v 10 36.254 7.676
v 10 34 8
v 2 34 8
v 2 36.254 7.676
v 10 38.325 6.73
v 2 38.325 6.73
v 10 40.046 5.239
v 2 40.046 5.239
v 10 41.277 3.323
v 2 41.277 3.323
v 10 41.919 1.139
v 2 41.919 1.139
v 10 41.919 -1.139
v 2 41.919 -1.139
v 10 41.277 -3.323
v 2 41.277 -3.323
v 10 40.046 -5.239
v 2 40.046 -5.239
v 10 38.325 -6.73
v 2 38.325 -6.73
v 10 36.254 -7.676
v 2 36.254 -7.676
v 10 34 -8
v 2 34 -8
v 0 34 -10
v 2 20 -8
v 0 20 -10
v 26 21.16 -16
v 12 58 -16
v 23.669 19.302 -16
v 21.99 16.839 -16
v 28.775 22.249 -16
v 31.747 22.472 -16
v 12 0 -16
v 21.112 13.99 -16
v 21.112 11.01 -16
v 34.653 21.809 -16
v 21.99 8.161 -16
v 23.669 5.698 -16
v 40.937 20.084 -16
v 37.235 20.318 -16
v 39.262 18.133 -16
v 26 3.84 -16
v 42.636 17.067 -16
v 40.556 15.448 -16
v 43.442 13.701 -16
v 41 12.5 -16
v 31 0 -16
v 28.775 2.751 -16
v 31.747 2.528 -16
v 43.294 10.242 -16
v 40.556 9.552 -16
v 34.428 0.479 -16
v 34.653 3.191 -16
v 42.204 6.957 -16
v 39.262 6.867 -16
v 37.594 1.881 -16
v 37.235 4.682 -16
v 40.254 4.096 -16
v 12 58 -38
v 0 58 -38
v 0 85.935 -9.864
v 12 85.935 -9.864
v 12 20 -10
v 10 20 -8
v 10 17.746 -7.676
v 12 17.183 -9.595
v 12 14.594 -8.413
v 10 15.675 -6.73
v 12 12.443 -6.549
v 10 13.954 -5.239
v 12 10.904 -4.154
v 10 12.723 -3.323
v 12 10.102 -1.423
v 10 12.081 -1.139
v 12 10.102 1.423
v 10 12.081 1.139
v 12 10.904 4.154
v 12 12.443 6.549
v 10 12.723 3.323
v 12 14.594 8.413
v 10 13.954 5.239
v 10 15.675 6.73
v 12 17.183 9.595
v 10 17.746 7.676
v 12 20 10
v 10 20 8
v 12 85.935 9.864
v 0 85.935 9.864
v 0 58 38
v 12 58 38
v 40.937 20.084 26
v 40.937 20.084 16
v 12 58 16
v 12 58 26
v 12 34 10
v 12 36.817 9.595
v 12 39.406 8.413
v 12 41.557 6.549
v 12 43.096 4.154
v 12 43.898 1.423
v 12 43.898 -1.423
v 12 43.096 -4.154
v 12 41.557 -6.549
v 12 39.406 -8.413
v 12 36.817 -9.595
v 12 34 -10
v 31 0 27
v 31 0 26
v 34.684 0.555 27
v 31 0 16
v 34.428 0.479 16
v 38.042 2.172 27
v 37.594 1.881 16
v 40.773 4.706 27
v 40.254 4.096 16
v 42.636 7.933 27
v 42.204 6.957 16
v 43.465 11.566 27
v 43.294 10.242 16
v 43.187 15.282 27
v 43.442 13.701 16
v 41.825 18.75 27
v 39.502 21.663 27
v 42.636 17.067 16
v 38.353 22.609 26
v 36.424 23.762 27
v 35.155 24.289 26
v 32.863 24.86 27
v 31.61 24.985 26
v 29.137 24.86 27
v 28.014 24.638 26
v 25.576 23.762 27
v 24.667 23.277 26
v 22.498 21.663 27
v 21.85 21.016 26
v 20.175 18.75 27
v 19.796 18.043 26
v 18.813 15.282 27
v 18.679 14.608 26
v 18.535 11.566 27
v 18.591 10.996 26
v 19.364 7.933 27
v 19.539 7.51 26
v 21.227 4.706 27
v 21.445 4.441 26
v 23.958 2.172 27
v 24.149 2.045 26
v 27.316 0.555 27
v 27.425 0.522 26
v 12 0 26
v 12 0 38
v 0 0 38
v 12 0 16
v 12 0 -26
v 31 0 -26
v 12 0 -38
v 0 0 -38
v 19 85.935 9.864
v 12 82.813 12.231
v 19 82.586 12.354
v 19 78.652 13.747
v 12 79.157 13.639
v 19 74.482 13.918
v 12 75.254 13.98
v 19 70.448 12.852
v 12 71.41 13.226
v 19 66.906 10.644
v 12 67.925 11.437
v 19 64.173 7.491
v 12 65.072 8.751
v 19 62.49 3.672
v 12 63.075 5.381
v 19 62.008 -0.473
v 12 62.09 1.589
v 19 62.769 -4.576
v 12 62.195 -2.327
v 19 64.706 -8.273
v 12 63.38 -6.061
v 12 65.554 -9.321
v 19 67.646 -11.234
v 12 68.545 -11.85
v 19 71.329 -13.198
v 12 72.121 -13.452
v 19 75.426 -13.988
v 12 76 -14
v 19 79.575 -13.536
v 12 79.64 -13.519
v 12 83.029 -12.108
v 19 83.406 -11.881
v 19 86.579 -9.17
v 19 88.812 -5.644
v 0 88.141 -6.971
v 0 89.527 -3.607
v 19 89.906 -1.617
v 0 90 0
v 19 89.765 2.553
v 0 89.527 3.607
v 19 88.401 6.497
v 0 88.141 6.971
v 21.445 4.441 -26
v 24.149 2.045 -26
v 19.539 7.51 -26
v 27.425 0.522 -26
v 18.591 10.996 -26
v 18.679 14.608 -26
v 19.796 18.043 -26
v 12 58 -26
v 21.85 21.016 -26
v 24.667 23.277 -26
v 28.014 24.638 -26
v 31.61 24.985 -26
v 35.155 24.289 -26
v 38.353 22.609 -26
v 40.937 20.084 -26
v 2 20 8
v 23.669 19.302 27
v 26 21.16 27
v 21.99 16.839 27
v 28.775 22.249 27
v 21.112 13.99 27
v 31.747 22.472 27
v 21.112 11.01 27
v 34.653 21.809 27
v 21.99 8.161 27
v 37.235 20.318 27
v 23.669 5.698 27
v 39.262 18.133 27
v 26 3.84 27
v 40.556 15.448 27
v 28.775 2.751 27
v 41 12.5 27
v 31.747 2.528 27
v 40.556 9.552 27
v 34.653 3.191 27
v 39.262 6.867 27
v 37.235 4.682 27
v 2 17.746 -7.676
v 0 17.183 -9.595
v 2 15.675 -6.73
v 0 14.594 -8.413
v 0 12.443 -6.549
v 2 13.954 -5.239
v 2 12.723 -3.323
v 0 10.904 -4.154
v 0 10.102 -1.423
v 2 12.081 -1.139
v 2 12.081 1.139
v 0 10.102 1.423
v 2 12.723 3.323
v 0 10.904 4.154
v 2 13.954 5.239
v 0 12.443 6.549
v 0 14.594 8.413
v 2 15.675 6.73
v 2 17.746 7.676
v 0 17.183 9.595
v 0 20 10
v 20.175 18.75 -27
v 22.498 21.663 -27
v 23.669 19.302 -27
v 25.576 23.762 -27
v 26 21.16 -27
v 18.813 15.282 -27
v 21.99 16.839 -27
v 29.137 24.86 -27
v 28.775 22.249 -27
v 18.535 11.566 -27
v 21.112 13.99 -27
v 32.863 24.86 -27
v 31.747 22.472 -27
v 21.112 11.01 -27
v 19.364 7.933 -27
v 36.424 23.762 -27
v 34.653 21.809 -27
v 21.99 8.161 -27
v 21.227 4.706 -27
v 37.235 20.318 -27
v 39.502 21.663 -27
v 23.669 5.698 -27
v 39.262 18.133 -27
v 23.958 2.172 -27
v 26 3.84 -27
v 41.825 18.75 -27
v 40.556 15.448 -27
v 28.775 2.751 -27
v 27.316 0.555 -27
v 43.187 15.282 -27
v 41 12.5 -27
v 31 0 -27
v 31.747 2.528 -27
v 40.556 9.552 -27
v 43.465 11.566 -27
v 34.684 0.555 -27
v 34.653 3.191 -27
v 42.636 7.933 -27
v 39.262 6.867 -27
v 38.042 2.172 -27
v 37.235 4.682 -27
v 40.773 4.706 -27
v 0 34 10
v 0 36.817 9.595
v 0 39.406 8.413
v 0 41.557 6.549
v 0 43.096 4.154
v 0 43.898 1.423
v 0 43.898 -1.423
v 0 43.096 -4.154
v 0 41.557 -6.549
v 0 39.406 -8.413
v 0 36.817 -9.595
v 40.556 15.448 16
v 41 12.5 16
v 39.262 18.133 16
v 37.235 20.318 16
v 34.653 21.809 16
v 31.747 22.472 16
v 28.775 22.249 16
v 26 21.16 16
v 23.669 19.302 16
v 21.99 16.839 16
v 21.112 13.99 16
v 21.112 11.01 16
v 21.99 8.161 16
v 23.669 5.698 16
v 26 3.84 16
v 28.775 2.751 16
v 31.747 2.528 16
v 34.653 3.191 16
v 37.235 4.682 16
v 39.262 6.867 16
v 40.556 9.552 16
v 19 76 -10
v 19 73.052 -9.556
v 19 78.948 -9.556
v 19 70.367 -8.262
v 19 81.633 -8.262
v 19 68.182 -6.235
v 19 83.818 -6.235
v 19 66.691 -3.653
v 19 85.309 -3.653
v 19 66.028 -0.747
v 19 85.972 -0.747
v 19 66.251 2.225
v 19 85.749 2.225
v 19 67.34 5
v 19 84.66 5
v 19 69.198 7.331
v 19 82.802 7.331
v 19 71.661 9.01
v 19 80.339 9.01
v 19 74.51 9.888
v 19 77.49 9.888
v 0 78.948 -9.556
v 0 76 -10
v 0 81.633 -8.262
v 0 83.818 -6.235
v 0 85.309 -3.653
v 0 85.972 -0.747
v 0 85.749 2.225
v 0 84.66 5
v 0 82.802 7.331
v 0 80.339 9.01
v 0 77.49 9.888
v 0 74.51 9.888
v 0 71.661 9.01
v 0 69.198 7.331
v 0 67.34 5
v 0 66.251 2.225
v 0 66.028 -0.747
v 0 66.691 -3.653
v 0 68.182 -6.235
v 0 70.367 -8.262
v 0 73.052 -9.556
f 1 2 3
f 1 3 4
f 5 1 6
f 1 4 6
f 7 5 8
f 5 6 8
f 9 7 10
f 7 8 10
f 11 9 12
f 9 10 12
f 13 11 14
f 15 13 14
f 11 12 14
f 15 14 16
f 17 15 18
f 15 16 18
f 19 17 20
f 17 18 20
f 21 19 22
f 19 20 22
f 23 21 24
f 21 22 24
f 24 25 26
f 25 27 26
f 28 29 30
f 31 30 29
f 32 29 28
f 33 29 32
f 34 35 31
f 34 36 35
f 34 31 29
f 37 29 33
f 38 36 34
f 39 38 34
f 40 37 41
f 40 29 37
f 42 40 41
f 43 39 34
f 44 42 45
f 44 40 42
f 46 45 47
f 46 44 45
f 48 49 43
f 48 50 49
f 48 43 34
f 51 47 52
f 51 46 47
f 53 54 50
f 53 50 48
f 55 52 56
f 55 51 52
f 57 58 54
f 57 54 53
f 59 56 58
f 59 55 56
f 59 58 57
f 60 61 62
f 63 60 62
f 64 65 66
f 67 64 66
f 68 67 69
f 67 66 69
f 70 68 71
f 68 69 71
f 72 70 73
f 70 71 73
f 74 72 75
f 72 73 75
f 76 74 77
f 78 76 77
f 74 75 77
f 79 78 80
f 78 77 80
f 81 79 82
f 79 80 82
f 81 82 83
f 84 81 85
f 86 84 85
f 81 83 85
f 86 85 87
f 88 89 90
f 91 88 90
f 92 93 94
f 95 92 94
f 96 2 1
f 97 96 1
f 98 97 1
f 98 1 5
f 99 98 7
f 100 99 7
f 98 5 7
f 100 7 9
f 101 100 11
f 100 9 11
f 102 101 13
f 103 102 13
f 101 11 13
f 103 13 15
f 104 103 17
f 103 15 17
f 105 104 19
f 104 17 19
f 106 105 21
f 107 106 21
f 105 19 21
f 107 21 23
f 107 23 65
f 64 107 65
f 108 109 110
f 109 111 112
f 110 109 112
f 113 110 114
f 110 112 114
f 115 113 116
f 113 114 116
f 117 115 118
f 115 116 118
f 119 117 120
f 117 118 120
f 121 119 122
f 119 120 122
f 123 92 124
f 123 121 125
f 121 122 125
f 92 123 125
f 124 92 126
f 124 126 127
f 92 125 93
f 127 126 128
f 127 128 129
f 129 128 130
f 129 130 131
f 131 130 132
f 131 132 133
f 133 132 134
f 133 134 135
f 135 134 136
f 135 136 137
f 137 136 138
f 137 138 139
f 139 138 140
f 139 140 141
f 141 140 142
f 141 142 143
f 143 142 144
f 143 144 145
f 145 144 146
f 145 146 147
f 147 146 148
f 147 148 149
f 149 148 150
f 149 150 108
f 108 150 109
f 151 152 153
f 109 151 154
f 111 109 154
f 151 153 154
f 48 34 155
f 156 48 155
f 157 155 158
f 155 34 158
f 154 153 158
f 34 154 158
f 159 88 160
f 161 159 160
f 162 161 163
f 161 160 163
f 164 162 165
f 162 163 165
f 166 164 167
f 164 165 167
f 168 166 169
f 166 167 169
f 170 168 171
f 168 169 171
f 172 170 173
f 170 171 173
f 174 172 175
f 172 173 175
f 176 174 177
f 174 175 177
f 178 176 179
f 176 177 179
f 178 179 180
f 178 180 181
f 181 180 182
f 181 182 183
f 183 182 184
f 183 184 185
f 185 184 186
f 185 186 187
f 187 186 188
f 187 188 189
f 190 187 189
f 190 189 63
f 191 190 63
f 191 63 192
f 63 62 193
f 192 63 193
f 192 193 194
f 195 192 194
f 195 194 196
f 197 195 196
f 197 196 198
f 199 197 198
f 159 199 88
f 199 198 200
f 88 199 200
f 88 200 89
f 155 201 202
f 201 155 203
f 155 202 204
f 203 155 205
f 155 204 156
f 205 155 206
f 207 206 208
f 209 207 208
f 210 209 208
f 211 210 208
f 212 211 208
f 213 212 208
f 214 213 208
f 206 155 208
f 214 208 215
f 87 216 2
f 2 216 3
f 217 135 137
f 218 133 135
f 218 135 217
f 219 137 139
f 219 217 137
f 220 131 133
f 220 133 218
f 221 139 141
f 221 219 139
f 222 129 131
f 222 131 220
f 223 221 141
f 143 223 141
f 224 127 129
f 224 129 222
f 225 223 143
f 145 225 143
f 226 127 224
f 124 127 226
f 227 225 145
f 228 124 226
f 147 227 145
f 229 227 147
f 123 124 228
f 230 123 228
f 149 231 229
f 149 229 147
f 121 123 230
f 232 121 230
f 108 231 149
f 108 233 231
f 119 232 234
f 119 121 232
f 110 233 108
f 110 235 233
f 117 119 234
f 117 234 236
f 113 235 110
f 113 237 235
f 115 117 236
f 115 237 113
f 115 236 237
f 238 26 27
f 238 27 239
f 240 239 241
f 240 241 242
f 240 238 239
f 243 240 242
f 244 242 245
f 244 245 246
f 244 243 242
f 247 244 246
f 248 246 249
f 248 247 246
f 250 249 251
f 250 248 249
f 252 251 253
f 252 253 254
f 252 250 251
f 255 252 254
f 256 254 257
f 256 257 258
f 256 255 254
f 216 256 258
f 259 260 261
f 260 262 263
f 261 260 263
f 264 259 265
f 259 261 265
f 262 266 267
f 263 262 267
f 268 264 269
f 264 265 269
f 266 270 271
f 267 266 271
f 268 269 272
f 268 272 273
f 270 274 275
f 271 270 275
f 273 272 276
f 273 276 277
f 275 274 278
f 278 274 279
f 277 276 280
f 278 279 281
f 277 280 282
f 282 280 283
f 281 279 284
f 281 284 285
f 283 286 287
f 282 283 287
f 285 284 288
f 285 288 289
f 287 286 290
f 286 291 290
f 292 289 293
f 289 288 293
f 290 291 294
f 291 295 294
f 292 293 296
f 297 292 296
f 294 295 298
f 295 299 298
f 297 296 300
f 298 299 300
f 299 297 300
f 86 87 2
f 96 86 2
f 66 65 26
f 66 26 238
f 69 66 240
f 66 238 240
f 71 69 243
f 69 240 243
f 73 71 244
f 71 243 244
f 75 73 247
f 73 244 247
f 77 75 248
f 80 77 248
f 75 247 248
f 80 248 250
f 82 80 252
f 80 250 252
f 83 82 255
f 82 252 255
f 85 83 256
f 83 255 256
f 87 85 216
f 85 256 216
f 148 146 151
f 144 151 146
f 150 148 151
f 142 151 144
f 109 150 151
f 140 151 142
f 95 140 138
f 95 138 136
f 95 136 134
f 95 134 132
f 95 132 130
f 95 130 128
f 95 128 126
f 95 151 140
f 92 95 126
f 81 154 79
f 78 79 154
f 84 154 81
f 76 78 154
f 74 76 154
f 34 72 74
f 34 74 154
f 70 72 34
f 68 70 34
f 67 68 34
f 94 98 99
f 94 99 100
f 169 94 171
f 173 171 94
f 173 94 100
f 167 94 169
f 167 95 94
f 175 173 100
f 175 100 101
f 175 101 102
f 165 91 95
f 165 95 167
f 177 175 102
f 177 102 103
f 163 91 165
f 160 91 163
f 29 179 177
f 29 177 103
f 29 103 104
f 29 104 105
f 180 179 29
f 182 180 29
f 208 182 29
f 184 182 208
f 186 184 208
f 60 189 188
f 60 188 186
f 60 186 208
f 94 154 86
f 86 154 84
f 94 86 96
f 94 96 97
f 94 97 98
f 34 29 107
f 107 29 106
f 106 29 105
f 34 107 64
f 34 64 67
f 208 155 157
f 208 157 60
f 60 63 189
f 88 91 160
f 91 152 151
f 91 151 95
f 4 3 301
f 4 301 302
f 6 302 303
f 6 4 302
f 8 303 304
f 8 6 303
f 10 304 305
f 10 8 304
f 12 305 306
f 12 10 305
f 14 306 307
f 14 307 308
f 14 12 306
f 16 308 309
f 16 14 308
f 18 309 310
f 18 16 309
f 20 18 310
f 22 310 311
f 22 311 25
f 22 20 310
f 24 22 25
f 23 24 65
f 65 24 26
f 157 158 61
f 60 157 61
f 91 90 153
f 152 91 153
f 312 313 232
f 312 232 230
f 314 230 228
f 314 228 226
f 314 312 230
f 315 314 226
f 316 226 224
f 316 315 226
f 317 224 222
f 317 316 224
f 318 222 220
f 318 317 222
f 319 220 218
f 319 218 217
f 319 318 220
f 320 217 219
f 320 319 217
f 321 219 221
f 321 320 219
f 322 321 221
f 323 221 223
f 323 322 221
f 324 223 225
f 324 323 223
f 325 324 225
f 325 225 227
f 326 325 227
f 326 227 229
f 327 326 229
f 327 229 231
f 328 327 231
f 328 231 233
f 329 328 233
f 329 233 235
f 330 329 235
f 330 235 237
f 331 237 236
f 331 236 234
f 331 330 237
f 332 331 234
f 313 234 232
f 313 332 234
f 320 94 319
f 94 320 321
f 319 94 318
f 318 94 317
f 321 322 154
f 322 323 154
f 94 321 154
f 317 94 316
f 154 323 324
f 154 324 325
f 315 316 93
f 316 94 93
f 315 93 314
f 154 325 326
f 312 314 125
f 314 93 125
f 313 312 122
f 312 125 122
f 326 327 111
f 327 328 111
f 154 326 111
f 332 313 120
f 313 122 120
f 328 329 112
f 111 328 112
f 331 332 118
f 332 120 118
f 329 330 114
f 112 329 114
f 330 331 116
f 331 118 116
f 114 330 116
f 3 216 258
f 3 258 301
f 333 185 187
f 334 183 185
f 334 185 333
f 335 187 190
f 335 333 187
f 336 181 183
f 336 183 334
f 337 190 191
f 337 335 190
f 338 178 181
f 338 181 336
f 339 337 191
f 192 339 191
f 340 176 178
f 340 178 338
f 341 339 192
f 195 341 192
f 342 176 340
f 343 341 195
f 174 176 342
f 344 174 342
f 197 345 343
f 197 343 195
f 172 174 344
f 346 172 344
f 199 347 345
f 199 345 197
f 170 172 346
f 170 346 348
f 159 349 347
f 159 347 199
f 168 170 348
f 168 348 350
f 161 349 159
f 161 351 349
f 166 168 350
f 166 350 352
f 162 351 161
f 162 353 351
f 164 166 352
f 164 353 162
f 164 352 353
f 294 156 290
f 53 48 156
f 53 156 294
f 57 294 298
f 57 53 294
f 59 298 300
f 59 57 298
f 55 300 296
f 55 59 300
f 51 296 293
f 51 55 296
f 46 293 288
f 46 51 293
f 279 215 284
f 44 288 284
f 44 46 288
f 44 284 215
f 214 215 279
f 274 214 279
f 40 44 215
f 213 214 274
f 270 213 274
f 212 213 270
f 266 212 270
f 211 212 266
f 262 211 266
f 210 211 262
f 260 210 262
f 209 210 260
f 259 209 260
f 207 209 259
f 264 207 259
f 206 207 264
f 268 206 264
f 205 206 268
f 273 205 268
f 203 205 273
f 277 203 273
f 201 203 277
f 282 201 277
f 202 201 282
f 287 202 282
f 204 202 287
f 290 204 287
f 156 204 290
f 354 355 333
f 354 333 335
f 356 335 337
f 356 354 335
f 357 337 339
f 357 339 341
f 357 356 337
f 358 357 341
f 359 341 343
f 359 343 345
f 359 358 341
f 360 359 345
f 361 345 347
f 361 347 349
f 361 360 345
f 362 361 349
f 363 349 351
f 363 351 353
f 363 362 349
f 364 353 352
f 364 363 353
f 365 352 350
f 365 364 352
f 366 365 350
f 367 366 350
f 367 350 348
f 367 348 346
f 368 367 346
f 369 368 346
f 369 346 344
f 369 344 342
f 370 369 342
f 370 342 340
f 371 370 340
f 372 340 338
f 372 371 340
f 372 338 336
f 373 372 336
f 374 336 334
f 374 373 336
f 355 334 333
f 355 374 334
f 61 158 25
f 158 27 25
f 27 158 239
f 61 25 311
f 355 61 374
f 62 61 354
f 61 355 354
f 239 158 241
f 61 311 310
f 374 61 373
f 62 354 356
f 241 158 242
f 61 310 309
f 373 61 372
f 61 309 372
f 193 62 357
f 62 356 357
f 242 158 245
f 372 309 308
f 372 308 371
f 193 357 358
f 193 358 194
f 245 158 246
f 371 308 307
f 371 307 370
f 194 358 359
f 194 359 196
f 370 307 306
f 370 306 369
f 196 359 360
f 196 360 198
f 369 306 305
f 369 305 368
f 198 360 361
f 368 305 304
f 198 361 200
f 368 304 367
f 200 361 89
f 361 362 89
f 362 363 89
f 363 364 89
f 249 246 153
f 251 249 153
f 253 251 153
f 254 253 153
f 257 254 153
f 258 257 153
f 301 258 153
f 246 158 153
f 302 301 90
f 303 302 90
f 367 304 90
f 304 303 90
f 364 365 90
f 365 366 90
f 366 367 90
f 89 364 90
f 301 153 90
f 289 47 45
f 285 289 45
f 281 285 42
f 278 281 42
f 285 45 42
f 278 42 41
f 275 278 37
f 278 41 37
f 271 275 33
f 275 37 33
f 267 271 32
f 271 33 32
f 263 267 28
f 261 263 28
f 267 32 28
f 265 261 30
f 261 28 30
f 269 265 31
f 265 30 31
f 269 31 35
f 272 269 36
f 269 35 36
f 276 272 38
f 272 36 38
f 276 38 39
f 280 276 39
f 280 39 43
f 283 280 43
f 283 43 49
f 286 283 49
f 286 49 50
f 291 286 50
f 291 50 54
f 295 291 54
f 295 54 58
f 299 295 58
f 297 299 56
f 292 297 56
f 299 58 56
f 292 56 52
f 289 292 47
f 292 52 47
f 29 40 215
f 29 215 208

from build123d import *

# Parameters (mm, degrees)
BOSS_EXTRUDE1_DEPTH = 12
SKETCH1_3_R         = 10
BOSS_EXTRUDE2_DEPTH = 19
BOSS_EXTRUDE3_START = 16
BOSS_EXTRUDE3_DEPTH = 10
BOSS_EXTRUDE4_START = 16
SKETCH2_4_R         = 10
BOSS_EXTRUDE4_DEPTH = 11
CHAMFER1_SIZE       = 2


with BuildPart() as part:
    # Sketch1 → Boss-Extrude1 (new body)
    with BuildSketch(Plane(origin=(0, 0, 0), x_dir=(0, 0, -1), z_dir=(1, 0, 0))):
        with BuildLine():
            Line((38, 0), (38, 58))
            Line((38, 58), (9.863920086, 85.934942403))
            ThreePointArc((9.863920086, 85.934942403), (12.924683385, 81.380758255), (14, 76))
            ThreePointArc((14, 76), (-5.380758255, 63.075316615), (-9.863920086, 85.934942403))
            Line((-9.863920086, 85.934942403), (-38, 58))
            Line((-38, 58), (-38, 0))
            Line((-38, 0), (38, 0))
        make_face()
        with BuildLine():
            ThreePointArc((-8, 34), (0, 42), (8, 34))
            Line((8, 34), (8, 20))
            ThreePointArc((8, 20), (0, 12), (-8, 20))
            Line((-8, 20), (-8, 34))
        make_face(mode=Mode.SUBTRACT)
    extrude(amount=BOSS_EXTRUDE1_DEPTH)

    # Sketch1<3> → Boss-Extrude2 (add)
    with BuildSketch(Plane(origin=(0, 0, 0), x_dir=(0, 0, -1), z_dir=(1, 0, 0))):
        with BuildLine():
            ThreePointArc((14, 76), (12.924683385, 81.380758255), (9.863920086, 85.934942403))
            ThreePointArc((9.863920086, 85.934942403), (0, 90), (-9.863920086, 85.934942403))
            ThreePointArc((-9.863920086, 85.934942403), (-5.380758255, 63.075316615), (14, 76))
        make_face()
        with Locations((0, 76)):
            Circle(SKETCH1_3_R, mode=Mode.SUBTRACT)
    extrude(amount=BOSS_EXTRUDE2_DEPTH)

    # Sketch2 → Boss-Extrude3 (add)
    with BuildSketch(Plane.XY.offset(BOSS_EXTRUDE3_START)):
        with BuildLine():
            Line((12, 58), (12, 0))
            Line((12, 0), (31, 0))
            ThreePointArc((31, 0), (19.796343324, 18.043291177), (40.936820993, 20.083507668))
            Line((40.936820993, 20.083507668), (12, 58))
        make_face()
    boss_extrude3 = extrude(amount=BOSS_EXTRUDE3_DEPTH)

    # Sketch2<4> → Boss-Extrude4 (add)
    with BuildSketch(Plane.XY.offset(BOSS_EXTRUDE4_START)):
        with BuildLine():
            ThreePointArc((40.936820993, 20.083507668), (19.796343324, 18.043291177), (31, 0))
            ThreePointArc((31, 0), (39.838834765, 3.661165235), (43.5, 12.5))
            ThreePointArc((43.5, 12.5), (42.841880392, 16.502482828), (40.936820993, 20.083507668))
        make_face()
        with Locations((31, 12.5)):
            Circle(SKETCH2_4_R, mode=Mode.SUBTRACT)
    boss_extrude4 = extrude(amount=BOSS_EXTRUDE4_DEPTH)

    # Mirror2: Boss-Extrude3, Boss-Extrude4 across plane
    add(boss_extrude3.mirror(Plane.XY))
    add(boss_extrude4.mirror(Plane.XY))

    # Chamfer1
    chamfer1_edges = [part.edges().sort_by_distance(p)[0] for p in [
        (0, 42, 0),
        (0, 27, -8),
        (0, 12, 0),
        (0, 27, 8),
        (12, 42, 0),
        (12, 27, 8),
        (12, 27, -8),
        (12, 12, 0),
    ]]
    chamfer(chamfer1_edges, length=CHAMFER1_SIZE)


solid = part.part
